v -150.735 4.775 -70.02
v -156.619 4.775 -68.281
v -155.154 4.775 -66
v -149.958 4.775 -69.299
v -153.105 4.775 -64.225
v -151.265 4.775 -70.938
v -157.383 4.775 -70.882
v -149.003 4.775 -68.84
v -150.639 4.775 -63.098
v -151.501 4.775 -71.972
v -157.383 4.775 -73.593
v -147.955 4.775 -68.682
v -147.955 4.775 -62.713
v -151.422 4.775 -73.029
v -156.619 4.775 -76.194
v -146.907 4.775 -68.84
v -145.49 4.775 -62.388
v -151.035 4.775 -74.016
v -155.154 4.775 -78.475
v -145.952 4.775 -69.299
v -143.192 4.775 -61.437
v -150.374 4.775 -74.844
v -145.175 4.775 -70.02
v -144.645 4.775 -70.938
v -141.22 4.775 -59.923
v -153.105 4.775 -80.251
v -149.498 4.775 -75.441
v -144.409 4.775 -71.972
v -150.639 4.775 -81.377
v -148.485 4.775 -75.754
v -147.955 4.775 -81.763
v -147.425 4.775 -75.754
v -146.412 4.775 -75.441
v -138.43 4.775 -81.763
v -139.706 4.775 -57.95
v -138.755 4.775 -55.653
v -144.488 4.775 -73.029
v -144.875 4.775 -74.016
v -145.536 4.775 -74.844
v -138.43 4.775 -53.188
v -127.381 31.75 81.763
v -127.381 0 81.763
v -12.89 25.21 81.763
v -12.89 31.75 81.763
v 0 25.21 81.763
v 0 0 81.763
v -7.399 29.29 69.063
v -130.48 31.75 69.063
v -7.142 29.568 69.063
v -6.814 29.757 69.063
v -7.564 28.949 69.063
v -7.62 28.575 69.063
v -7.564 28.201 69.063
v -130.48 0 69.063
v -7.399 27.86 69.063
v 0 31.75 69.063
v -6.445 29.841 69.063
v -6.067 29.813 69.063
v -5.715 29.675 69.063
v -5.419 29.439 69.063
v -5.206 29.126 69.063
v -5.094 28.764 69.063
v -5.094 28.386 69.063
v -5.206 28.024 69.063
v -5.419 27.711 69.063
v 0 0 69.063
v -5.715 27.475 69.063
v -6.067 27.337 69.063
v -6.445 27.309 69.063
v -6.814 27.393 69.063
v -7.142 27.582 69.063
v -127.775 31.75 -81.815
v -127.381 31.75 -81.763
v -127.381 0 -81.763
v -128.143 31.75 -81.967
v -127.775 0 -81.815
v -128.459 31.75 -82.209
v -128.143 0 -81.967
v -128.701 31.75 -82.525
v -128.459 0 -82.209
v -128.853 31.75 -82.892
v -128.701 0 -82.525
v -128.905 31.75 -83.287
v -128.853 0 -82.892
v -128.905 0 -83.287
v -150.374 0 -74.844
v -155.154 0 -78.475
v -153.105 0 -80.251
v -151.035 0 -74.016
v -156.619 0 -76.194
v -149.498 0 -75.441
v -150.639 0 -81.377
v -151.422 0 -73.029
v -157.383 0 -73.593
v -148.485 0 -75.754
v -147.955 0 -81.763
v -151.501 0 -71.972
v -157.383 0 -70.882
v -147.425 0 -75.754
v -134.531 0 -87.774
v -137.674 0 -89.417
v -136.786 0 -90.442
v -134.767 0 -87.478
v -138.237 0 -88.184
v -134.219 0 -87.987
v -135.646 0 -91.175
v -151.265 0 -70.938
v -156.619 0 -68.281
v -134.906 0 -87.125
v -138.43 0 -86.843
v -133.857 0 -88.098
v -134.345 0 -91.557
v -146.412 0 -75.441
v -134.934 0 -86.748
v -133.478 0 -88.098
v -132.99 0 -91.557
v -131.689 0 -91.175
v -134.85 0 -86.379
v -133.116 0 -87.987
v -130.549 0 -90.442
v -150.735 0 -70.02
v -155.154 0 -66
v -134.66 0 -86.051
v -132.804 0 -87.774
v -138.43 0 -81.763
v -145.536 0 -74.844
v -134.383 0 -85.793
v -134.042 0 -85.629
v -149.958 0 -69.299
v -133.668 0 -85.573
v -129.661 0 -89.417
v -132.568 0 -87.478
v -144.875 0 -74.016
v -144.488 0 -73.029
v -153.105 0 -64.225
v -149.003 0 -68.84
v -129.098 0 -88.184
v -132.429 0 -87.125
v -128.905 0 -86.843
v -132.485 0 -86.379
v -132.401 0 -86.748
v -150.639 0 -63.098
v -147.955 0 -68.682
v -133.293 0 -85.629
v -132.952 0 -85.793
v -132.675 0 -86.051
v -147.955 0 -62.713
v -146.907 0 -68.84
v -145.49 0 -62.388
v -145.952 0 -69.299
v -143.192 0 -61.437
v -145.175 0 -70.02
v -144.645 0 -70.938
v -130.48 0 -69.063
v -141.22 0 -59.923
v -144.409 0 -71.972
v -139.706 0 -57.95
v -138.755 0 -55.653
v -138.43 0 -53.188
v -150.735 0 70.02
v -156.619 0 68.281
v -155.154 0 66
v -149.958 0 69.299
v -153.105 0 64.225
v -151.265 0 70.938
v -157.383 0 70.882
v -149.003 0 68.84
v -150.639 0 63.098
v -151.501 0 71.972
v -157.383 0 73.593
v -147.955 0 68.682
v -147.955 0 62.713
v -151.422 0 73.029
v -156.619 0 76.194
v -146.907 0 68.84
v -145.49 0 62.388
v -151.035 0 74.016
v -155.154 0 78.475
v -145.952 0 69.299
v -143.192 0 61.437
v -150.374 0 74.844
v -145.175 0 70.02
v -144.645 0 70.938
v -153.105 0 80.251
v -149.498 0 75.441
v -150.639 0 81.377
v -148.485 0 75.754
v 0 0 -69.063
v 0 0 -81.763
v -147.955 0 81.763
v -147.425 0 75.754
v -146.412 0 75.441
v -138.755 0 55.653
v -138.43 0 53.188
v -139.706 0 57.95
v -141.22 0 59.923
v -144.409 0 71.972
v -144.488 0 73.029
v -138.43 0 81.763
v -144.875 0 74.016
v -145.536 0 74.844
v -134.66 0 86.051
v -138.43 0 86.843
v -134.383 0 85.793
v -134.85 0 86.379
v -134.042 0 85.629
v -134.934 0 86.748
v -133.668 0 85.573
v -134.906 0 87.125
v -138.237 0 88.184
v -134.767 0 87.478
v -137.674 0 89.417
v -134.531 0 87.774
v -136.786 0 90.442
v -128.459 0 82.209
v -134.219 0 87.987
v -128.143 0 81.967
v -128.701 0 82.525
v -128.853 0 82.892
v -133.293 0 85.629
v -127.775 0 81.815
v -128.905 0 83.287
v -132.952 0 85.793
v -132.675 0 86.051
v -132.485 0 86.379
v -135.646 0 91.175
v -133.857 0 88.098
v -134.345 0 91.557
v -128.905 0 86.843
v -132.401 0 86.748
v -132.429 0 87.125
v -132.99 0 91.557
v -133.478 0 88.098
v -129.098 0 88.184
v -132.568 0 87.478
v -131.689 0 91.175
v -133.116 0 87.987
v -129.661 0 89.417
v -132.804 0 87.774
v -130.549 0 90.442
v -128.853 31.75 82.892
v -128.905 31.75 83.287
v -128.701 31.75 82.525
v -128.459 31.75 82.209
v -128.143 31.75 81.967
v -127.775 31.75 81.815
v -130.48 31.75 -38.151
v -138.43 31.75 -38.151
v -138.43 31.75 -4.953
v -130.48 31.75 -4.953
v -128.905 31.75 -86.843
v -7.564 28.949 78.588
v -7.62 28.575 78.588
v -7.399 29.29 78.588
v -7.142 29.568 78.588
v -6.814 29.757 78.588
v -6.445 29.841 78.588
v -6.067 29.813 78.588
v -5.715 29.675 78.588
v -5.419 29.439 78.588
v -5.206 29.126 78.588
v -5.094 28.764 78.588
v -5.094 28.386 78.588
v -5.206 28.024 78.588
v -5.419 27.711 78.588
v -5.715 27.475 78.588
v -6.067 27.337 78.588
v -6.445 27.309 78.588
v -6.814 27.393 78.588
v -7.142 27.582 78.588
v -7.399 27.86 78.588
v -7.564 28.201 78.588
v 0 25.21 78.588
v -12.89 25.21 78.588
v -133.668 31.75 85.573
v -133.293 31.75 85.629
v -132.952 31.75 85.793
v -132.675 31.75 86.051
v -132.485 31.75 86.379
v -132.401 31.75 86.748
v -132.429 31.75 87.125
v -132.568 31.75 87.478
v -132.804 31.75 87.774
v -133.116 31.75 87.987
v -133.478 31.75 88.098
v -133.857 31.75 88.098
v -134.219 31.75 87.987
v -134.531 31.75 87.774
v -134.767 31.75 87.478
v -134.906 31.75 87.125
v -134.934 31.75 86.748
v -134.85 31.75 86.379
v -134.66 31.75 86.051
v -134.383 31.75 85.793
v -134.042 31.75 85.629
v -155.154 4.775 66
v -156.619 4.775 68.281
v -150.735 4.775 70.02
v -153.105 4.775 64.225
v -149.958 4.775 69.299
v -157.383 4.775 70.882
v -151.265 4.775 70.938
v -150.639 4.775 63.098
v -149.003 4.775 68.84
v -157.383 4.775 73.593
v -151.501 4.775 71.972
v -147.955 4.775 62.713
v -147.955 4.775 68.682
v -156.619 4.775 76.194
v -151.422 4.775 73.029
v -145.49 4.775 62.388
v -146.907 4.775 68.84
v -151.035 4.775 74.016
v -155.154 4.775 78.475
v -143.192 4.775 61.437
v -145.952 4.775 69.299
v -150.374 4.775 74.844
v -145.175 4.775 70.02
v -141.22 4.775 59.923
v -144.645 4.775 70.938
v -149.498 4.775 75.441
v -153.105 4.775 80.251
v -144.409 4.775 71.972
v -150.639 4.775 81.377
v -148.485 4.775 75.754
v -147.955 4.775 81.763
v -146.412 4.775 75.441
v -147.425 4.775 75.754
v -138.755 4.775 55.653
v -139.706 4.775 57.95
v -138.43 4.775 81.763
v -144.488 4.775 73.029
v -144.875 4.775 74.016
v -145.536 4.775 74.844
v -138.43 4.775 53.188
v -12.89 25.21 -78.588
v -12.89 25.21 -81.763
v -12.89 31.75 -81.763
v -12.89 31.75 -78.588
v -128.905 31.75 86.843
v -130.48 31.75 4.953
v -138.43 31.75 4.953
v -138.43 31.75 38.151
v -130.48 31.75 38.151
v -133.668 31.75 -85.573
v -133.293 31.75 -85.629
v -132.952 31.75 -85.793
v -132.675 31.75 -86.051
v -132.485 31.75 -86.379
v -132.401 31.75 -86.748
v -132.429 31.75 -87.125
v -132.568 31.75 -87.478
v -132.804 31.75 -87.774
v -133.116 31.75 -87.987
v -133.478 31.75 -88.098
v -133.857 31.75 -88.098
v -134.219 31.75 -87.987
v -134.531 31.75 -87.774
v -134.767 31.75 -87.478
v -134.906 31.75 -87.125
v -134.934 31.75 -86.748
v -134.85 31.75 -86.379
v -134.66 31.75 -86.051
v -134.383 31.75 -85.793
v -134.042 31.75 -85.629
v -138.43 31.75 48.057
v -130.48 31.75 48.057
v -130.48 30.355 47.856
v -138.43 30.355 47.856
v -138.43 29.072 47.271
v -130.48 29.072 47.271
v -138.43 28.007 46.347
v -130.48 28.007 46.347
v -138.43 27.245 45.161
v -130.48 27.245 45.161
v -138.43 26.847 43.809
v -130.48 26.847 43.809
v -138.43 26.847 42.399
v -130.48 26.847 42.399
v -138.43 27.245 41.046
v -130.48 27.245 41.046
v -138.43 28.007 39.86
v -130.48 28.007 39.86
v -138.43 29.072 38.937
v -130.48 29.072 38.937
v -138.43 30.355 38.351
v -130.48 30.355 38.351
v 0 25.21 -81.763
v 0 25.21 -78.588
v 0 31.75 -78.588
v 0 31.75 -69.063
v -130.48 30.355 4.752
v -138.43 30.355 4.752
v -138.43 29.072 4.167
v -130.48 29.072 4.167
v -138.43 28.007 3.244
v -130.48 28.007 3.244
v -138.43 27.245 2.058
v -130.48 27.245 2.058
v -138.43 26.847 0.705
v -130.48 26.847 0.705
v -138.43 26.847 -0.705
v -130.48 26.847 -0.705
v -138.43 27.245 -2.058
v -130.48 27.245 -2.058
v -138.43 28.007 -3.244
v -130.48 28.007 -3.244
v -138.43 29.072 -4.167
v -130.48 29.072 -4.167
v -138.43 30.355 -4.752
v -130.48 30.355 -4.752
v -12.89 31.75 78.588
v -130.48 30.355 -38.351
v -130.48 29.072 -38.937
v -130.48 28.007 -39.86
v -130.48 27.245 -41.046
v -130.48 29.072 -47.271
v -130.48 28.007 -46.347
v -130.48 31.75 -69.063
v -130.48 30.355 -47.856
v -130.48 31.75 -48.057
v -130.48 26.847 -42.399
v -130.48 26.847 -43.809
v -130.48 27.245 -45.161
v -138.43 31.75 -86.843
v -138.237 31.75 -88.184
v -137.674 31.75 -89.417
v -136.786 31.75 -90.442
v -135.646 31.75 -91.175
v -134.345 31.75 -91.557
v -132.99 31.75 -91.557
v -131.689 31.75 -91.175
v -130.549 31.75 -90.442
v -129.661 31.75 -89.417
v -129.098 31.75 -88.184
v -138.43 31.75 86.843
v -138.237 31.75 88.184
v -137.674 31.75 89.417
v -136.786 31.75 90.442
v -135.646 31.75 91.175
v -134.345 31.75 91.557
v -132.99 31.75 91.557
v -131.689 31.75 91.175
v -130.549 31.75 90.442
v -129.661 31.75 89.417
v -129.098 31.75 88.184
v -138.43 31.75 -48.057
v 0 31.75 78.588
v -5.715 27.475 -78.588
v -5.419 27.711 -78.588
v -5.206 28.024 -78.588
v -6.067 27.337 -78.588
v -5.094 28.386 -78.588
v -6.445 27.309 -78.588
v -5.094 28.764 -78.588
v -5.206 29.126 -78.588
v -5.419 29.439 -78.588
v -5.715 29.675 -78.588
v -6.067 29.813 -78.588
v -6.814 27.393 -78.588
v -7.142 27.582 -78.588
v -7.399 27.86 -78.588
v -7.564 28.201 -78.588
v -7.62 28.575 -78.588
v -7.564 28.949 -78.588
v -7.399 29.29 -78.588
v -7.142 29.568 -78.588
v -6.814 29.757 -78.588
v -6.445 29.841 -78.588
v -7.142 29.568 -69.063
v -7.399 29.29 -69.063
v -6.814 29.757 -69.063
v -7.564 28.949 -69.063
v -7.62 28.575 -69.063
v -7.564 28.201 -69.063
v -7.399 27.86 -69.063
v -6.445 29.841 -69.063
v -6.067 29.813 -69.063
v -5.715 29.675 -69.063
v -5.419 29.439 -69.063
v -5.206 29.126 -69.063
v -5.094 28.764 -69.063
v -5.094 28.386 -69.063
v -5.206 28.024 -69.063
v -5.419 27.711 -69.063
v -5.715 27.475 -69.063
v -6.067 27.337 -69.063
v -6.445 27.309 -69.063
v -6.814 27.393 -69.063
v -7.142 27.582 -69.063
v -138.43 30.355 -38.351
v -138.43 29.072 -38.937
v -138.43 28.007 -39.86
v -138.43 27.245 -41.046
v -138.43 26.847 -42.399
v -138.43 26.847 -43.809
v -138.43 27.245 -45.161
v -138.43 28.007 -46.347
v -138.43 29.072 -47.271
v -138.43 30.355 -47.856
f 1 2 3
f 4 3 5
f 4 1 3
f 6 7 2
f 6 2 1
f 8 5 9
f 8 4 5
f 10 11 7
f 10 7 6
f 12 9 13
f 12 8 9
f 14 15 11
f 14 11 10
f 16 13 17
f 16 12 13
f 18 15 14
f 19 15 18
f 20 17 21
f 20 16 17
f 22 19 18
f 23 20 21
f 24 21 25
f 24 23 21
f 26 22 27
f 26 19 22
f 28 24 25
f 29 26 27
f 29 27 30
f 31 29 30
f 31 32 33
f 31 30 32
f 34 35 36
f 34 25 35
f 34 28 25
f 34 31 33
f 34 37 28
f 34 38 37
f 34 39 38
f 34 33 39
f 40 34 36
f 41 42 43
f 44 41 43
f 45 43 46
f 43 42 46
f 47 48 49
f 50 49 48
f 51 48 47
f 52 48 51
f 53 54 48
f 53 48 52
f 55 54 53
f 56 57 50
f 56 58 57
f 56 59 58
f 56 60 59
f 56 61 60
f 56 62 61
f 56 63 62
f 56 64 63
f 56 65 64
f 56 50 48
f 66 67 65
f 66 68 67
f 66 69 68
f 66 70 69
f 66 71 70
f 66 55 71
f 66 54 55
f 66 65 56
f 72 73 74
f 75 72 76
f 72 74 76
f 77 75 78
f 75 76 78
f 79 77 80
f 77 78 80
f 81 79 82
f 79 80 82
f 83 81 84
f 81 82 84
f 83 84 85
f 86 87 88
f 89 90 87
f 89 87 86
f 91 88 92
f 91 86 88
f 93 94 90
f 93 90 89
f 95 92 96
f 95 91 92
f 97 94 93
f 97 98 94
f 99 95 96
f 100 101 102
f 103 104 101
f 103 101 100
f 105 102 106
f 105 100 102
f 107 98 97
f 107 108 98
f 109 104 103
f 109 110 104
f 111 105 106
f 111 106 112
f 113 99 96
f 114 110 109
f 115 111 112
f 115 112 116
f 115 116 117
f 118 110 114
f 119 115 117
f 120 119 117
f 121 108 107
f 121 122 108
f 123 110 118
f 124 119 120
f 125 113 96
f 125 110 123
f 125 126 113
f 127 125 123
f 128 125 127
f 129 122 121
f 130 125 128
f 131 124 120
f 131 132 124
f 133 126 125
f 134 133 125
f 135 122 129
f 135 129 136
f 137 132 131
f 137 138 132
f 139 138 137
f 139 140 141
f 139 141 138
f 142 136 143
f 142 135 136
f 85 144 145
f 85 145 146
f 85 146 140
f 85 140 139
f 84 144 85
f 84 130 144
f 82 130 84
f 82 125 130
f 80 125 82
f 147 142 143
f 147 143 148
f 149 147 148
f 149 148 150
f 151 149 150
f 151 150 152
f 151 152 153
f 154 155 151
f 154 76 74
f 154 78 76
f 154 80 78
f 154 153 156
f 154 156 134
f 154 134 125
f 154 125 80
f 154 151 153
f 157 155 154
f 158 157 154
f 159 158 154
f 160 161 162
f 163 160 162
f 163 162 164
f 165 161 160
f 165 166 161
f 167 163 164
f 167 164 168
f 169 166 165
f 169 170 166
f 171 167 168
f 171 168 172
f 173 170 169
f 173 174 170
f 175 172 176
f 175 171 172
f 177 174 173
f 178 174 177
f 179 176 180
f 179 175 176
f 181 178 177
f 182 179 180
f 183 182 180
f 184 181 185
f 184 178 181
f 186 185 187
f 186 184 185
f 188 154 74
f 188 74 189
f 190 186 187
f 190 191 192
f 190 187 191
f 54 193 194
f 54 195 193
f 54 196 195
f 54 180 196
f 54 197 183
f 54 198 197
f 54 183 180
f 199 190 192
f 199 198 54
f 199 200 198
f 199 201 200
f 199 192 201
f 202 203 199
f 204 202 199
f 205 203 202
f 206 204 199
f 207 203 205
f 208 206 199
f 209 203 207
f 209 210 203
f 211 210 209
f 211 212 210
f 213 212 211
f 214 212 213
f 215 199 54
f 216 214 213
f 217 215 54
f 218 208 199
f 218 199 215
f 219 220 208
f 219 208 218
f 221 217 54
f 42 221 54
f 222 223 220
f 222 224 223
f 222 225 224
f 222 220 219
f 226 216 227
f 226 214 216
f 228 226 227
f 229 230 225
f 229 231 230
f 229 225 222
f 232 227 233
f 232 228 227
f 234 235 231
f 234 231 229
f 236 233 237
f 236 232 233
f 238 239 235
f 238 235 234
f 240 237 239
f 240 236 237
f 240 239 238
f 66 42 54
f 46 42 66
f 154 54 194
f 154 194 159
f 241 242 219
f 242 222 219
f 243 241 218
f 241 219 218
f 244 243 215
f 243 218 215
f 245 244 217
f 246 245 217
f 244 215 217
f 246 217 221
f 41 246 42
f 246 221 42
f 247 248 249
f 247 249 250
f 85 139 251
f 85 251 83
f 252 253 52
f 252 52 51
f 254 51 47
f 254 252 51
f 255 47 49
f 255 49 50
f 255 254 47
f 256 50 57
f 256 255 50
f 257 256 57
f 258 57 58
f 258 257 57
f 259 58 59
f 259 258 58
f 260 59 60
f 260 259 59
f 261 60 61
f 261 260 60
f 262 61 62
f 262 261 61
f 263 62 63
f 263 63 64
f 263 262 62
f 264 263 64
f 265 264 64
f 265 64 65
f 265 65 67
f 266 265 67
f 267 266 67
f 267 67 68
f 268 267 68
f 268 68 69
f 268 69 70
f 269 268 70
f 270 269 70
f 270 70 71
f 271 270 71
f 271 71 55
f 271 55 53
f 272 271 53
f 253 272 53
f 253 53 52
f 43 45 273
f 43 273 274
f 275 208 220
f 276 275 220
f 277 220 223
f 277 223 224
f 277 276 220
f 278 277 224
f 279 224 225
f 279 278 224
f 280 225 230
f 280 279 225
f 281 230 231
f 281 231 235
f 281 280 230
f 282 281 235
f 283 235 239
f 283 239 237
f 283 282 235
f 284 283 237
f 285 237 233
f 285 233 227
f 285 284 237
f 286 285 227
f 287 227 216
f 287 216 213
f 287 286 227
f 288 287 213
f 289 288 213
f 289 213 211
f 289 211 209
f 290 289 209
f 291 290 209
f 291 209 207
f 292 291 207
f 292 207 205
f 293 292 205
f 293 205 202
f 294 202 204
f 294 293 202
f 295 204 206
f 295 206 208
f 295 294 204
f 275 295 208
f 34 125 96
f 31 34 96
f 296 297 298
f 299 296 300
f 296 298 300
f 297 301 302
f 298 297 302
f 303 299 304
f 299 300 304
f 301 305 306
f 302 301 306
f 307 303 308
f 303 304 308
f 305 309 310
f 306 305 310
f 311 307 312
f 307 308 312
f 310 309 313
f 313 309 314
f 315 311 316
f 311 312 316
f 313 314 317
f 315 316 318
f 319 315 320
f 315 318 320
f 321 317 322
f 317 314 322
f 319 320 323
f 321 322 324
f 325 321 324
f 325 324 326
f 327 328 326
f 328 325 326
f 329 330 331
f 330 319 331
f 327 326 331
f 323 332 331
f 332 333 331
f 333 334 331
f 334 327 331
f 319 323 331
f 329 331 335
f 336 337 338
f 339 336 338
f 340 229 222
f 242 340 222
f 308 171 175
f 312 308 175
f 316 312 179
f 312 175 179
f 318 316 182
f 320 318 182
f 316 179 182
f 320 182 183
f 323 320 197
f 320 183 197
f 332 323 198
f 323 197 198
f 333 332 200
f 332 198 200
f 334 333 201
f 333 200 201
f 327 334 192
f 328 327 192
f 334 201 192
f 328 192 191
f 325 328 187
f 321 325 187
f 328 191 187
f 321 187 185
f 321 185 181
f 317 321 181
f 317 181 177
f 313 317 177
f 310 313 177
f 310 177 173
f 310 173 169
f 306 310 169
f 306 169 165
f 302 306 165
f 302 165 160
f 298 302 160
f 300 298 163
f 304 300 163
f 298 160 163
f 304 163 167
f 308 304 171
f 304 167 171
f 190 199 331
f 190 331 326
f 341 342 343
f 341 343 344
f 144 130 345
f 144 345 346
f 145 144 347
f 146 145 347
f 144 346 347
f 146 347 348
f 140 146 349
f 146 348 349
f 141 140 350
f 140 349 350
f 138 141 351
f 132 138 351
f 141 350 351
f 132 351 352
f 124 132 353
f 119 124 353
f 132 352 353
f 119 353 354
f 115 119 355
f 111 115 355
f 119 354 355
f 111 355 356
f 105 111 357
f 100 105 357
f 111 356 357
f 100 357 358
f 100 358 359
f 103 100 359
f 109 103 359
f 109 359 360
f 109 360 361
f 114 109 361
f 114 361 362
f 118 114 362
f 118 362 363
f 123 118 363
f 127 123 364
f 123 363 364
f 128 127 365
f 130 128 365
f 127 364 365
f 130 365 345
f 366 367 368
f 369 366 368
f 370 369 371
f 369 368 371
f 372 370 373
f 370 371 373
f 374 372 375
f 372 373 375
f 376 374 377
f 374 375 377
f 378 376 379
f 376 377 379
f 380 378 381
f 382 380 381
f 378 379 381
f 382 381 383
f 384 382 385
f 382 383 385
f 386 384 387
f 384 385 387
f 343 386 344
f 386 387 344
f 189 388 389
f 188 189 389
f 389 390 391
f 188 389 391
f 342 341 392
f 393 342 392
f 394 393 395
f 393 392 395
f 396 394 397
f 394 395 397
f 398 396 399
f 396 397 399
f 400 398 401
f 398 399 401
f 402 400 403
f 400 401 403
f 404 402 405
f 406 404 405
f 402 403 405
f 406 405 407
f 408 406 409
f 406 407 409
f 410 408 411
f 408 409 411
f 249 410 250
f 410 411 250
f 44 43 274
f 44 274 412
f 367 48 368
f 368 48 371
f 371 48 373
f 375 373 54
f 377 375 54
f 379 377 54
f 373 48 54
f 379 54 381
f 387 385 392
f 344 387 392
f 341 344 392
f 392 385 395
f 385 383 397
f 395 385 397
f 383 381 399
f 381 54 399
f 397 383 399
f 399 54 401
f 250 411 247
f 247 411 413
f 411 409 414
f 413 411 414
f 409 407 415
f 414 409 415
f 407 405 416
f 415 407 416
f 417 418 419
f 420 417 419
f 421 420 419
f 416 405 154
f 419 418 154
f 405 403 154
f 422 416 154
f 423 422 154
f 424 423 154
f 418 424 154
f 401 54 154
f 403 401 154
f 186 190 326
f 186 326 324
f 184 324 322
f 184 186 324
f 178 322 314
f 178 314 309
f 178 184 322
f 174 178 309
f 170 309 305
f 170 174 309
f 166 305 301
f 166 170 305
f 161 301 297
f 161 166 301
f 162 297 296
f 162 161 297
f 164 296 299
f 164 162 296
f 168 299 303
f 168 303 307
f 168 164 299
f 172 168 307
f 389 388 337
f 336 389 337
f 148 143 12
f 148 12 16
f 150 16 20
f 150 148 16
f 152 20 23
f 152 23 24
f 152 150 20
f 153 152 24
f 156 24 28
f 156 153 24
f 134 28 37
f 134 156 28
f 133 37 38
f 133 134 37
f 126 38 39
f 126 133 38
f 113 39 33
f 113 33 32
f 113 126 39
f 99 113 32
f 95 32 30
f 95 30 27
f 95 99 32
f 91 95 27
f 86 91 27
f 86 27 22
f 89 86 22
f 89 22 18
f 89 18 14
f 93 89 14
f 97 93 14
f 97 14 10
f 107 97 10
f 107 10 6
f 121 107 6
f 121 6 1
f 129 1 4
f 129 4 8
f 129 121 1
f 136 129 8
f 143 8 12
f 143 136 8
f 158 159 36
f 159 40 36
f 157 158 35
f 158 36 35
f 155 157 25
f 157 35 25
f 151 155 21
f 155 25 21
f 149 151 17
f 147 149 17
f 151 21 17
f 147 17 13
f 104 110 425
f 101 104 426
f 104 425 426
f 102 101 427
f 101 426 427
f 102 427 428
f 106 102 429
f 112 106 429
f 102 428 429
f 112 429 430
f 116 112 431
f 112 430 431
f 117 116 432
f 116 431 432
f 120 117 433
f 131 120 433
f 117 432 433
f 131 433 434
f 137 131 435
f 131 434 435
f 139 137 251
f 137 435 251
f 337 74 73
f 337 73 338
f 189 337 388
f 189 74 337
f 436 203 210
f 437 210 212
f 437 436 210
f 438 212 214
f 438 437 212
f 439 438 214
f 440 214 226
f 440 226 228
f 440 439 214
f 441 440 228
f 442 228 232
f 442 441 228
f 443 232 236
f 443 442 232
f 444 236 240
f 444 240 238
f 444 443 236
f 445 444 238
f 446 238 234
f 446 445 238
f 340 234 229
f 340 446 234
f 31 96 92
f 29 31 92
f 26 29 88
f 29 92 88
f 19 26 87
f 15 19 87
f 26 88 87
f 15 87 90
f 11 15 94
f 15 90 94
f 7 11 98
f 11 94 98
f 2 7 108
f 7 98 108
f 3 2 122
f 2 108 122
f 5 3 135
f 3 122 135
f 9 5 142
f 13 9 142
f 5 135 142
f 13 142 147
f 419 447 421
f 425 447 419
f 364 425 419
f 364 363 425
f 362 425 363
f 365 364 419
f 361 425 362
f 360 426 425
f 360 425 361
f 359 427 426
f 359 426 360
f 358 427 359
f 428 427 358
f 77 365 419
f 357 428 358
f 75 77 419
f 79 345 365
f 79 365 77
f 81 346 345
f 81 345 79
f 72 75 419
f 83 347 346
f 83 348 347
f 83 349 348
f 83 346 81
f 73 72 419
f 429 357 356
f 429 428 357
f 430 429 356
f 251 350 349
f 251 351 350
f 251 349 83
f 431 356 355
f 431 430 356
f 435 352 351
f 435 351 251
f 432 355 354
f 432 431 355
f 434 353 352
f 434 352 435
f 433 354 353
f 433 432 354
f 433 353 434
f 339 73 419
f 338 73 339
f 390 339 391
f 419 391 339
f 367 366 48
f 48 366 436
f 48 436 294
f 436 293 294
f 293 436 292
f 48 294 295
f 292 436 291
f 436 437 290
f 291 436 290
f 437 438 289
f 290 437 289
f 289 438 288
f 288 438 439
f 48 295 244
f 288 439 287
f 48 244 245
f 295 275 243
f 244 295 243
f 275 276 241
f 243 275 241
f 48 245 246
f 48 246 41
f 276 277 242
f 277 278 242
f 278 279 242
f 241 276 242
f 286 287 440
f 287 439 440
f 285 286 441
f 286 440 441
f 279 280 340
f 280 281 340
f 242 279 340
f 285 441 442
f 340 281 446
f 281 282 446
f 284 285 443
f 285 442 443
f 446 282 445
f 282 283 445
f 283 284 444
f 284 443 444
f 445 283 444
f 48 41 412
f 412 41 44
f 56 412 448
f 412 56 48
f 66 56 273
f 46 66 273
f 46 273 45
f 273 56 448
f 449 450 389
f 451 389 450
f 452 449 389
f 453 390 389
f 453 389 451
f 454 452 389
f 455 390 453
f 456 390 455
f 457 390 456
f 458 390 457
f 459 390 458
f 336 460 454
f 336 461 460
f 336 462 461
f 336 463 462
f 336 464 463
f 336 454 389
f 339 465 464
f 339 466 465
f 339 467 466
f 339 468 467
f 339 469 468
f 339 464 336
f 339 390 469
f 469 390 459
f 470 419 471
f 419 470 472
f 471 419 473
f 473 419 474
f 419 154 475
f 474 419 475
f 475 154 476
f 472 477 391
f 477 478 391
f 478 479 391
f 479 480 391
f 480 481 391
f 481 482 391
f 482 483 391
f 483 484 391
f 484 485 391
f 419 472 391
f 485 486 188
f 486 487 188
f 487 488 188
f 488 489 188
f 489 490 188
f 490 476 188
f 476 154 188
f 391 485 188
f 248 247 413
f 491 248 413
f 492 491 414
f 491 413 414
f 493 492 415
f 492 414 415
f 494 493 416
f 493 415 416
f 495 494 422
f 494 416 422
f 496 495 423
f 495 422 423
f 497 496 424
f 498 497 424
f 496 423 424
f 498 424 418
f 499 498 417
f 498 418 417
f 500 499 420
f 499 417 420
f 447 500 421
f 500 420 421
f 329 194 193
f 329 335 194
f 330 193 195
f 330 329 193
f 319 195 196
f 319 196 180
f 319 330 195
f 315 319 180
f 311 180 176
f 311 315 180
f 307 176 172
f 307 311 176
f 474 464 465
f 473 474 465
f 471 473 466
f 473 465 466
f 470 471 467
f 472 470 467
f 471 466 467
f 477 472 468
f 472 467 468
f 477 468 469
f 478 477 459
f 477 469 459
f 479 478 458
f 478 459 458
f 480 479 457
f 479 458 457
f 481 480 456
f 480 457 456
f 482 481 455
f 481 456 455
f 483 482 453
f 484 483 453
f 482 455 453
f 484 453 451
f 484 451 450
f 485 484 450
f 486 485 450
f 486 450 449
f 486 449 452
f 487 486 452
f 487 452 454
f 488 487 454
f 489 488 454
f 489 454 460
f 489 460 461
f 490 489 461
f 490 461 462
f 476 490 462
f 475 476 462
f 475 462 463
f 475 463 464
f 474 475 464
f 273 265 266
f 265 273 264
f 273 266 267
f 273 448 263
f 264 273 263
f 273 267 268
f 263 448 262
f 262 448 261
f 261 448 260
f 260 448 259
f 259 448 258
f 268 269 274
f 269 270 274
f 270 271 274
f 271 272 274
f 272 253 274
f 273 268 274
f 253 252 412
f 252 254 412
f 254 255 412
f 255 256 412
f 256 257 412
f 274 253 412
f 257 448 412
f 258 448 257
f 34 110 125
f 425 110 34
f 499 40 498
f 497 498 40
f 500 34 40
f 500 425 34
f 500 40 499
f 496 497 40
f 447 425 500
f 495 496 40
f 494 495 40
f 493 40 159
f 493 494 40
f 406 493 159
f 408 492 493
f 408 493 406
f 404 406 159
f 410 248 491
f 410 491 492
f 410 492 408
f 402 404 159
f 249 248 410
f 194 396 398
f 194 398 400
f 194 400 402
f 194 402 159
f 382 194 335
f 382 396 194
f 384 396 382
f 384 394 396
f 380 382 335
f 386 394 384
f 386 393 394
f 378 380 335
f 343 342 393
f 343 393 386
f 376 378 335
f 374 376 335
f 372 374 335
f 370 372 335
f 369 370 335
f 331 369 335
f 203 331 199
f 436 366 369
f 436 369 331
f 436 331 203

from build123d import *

# Parameters (mm, degrees)
SKETCH1_W               = 276.86
SKETCH1_H               = 163.5252
SKETCH1_W_2             = 260.9596
SKETCH1_H_2             = 138.1252
BOSS_EXTRUDE1_DEPTH     = 31.75
SKETCH2_R               = 4.953
CUT_EXTRUDE1_DEPTH      = 291.421495173
SKETCH3_R               = 1.27
BOSS_EXTRUDE2_DEPTH     = 31.75
MIRROR4_COPY_1_SKETCH_R = 1.27
MIRROR4_COPY_1_DEPTH    = 31.75
FILLET2_R               = 1.524
SKETCH4_W               = 25.781
SKETCH4_H               = 13.081
CUT_EXTRUDE2_DEPTH      = 3.175
CUT_EXTRUDE3_REACH      = 223.668
SKETCH5_R               = 1.27
CUT_EXTRUDE4_DEPTH      = 170.004206297
SKETCH7_R               = 3.556
BOSS_EXTRUDE3_DEPTH     = 4.7752
FILLET3_R               = 9.525


with BuildPart() as part:
    # Sketch1 → Boss-Extrude1 (new body)
    with BuildSketch(Plane(origin=(0, 0, 0), x_dir=(1, 0, 0), z_dir=(0, 1, 0))):
        Rectangle(SKETCH1_W, SKETCH1_H)
        Rectangle(SKETCH1_W_2, SKETCH1_H_2, mode=Mode.SUBTRACT)
    extrude(amount=BOSS_EXTRUDE1_DEPTH)

    # Sketch2 → Cut-Extrude1 (cut, through all)
    with BuildSketch(Plane(origin=(138.43, 0, 0), x_dir=(0, 0, -1), z_dir=(1, 0, 0))):
        with Locations((0, 31.75)):
            Circle(SKETCH2_R)
        with Locations((43.1038, 31.75)):
            Circle(SKETCH2_R)
        with Locations((-43.1038, 31.75)):
            Circle(SKETCH2_R)
    extrude(amount=-CUT_EXTRUDE1_DEPTH, mode=Mode.SUBTRACT)

    # Sketch3 → Boss-Extrude2 (add, through all)
    with BuildSketch(Plane(origin=(0, 31.75, 0), x_dir=(1, 0, 0), z_dir=(0, 1, 0))):
        with BuildLine():
            Line((-138.43, 81.7626), (-138.43, 86.8426))
            ThreePointArc((-138.43, 86.8426), (-133.6675, 91.6051), (-128.905, 86.8426))
            Line((-128.905, 86.8426), (-128.905, 81.7626))
            Line((-128.905, 81.7626), (-138.43, 81.7626))
        make_face()
        with Locations(Location((-133.6675, 86.8426, 0), (0, 0, 270))):
            Circle(SKETCH3_R, mode=Mode.SUBTRACT)
    boss_extrude2 = extrude(amount=-BOSS_EXTRUDE2_DEPTH)

    # Mirror3: Boss-Extrude2 across plane
    add(boss_extrude2.mirror(Plane(origin=(0, 0, 0), x_dir=(0, 0, 1), z_dir=(1, 0, 0))))

    # Mirror4: Boss-Extrude2 across plane
    add(boss_extrude2.mirror(Plane.XY))

    # Mirror4 copy 1 sketch → Mirror4 copy 1 (add, through all)
    with BuildSketch(Plane(origin=(0, 31.75, 0), x_dir=(-1, 0, 0), z_dir=(0, 1, 0))):
        with BuildLine():
            Line((-138.43, 81.7626), (-138.43, 86.8426))
            ThreePointArc((-138.43, 86.8426), (-133.6675, 91.6051), (-128.905, 86.8426))
            Line((-128.905, 86.8426), (-128.905, 81.7626))
            Line((-128.905, 81.7626), (-138.43, 81.7626))
        make_face()
        with Locations(Location((-133.6675, 86.8426, 0), (0, 0, 270))):
            Circle(MIRROR4_COPY_1_SKETCH_R, mode=Mode.SUBTRACT)
    extrude(amount=-MIRROR4_COPY_1_DEPTH)

    # Fillet2
    fillet2_edges = [part.edges().sort_by_distance(p)[0] for p in [
        (-128.905, 15.875, 81.7626),
        (128.905, 15.875, 81.7626),
        (-128.905, 15.875, -81.7626),
        (128.905, 15.875, -81.7626),
    ]]
    fillet(fillet2_edges, radius=FILLET2_R)

    # Sketch4 → Cut-Extrude2 (cut)
    with BuildSketch(Plane(origin=(0, 0, -81.7626), x_dir=(-1, 0, 0), z_dir=(0, 0, -1))):
        with Locations((0, 31.75)):
            Rectangle(SKETCH4_W, SKETCH4_H)
    cut_extrude2 = extrude(amount=-CUT_EXTRUDE2_DEPTH, mode=Mode.SUBTRACT)

    # Sketch5 → Cut-Extrude3 (cut, up to next)
    with BuildSketch(Plane(origin=(0, 0, -78.5876), x_dir=(-1, 0, 0), z_dir=(0, 0, -1)), mode=Mode.PRIVATE) as cut_extrude3_sk1:
        with Locations((-6.35, 28.575)):
            Circle(SKETCH5_R)
    cut_extrude3_tool1 = extrude(cut_extrude3_sk1.sketch, amount=-CUT_EXTRUDE3_REACH, mode=Mode.PRIVATE) & part.part
    # Sketch5 → Cut-Extrude3 (cut, up to next)
    with BuildSketch(Plane(origin=(0, 0, -78.5876), x_dir=(-1, 0, 0), z_dir=(0, 0, -1)), mode=Mode.PRIVATE) as cut_extrude3_sk2:
        with Locations((6.35, 28.575)):
            Circle(SKETCH5_R)
    cut_extrude3_tool2 = extrude(cut_extrude3_sk2.sketch, amount=-CUT_EXTRUDE3_REACH, mode=Mode.PRIVATE) & part.part
    cut_extrude3_1 = cut_extrude3_tool1.solids().sort_by_distance((6.35, 28.575, -78.5876))[0]
    add(cut_extrude3_1, mode=Mode.SUBTRACT)
    cut_extrude3_2 = cut_extrude3_tool2.solids().sort_by_distance((-6.35, 28.575, -78.5876))[0]
    add(cut_extrude3_2, mode=Mode.SUBTRACT)
    cut_extrude3 = cut_extrude3_1 + cut_extrude3_2  # Cut-Extrude3 as one shape, for the pattern or mirror that repeats it

    # Mirror5: Cut-Extrude2, Cut-Extrude3 across plane
    add(cut_extrude2.mirror(Plane.XY), mode=Mode.SUBTRACT)
    add(cut_extrude3.mirror(Plane.XY), mode=Mode.SUBTRACT)

    # Sketch6 → Cut-Extrude4 (cut, through all)
    with BuildSketch(Plane(origin=(0, 31.75, 0), x_dir=(1, 0, 0), z_dir=(0, 1, 0))):
        Polygon((0, 0), (0, 94.782822777), (154.500251477, 94.782822777), (154.500251477, -104.416951251), (0, -98.891495214), align=None)
    extrude(amount=-CUT_EXTRUDE4_DEPTH, mode=Mode.SUBTRACT)

    # Sketch7 → Boss-Extrude3 (add)
    with BuildSketch(Plane.XZ):
        with BuildLine():
            Line((-138.43, 81.7626), (-147.955, 81.7626))
            ThreePointArc((-147.955, 81.7626), (-157.48, 72.2376), (-147.955, 62.7126))
            Line((-147.955, 62.7126), (-138.43, 62.7126))
            Line((-138.43, 62.7126), (-138.43, 81.7626))
        make_face()
        with Locations(Location((-147.955, 72.2376, 0), (0, 0, 270))):
            Circle(SKETCH7_R, mode=Mode.SUBTRACT)
    boss_extrude3 = extrude(amount=-BOSS_EXTRUDE3_DEPTH)

    # Mirror6: Boss-Extrude3 across plane
    add(boss_extrude3.mirror(Plane.XY))

    # Fillet3
    fillet3_edges = [part.edges().sort_by_distance(p)[0] for p in [
        (-138.43, 2.3876, -62.7126),
        (-138.43, 2.3876, 62.7126),
    ]]
    fillet(fillet3_edges, radius=FILLET3_R - 0.0001)  # a hair under: the kernel refuses the full size


solid = part.part
